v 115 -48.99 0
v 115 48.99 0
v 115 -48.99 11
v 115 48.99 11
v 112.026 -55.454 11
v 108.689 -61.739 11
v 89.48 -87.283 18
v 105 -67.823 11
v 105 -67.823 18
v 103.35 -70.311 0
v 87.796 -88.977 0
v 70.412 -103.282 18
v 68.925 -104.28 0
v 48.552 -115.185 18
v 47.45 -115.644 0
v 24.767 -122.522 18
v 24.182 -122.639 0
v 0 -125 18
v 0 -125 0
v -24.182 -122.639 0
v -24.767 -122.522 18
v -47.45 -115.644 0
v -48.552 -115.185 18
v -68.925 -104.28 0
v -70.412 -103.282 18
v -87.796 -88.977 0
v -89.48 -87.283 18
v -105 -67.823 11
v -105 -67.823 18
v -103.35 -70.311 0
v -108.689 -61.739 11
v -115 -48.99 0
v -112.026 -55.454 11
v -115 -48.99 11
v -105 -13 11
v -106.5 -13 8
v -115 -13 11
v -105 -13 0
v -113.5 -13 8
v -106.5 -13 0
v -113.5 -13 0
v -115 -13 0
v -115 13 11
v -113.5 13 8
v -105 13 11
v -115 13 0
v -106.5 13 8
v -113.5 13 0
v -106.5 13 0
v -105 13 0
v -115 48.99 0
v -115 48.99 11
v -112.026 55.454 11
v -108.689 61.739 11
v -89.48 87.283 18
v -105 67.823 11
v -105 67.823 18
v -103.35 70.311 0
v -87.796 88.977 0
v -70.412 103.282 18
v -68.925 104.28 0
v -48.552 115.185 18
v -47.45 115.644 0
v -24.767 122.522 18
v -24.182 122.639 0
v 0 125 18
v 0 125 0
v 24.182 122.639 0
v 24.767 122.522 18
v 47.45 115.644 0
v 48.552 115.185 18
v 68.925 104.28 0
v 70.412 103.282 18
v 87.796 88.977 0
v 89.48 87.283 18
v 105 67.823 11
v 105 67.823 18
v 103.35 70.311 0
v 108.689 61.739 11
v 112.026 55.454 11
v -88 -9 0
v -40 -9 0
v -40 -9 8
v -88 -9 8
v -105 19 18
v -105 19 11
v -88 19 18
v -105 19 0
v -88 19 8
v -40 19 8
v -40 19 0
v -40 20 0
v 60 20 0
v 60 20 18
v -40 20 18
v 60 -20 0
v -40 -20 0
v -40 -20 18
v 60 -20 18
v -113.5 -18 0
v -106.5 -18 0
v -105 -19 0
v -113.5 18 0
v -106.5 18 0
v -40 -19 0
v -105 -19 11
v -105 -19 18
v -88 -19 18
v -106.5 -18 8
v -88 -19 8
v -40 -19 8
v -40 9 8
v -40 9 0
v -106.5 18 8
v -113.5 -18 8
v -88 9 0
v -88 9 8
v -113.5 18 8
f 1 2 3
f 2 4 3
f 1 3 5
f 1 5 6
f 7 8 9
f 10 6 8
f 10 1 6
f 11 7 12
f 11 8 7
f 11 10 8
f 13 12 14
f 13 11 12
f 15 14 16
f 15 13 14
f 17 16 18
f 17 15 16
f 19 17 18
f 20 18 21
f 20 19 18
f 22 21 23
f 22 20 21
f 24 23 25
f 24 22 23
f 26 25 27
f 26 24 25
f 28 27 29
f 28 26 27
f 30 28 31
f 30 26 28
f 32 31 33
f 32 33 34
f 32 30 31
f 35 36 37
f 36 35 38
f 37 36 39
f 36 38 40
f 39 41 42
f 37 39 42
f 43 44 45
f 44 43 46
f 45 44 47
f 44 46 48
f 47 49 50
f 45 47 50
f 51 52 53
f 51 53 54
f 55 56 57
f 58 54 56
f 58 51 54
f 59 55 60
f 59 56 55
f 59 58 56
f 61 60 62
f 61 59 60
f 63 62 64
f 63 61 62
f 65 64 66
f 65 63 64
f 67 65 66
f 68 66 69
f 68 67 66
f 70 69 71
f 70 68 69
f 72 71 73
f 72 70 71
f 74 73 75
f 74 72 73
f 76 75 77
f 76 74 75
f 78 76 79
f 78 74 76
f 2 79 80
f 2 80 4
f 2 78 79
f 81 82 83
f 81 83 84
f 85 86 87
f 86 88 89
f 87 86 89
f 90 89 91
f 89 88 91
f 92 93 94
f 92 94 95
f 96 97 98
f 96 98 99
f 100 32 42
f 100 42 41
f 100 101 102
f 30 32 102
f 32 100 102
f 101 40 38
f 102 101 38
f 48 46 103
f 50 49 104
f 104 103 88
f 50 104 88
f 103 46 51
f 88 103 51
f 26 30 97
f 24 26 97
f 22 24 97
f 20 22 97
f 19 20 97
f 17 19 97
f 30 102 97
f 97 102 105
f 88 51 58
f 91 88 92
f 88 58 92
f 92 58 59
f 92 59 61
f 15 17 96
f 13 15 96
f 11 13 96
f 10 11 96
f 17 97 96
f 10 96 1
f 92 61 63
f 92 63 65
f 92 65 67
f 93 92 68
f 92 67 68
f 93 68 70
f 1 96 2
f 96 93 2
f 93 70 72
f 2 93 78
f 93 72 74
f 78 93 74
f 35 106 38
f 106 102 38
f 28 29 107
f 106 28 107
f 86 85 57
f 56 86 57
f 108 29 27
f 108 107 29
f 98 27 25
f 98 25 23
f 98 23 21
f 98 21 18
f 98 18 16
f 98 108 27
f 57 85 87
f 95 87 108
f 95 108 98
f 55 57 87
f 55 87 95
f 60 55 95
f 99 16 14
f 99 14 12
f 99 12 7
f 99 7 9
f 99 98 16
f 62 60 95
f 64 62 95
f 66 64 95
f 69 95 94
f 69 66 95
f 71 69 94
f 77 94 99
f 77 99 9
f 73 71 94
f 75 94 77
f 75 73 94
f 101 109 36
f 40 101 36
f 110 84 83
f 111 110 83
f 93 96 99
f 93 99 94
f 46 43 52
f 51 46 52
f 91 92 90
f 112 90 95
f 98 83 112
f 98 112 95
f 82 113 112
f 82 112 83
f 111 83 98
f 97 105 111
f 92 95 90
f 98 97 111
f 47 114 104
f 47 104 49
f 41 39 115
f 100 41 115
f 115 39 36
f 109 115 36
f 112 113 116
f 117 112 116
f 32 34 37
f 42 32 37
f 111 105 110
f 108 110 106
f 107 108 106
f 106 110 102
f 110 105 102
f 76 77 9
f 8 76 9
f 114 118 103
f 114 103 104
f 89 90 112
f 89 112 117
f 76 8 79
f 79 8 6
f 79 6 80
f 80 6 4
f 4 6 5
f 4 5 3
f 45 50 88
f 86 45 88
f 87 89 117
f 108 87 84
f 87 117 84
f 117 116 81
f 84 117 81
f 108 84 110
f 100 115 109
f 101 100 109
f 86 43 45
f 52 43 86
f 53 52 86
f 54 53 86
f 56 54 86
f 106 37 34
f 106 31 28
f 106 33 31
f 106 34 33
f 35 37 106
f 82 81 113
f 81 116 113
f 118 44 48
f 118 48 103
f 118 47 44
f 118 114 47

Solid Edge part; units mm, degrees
sketch "Sketch1" plane through (0, 0, 0) normal (0, 0, 1) x (1, 0, 0)
  circle A0 centre (0, 0) radius 125
extrude "Protrusion1" add sketch "Sketch1" along normal blind 18
sketch "Sketch2" plane through (0, 0, 18) normal (0, 0, 1) x (1, 0, 0)
  line L0 (115, 48.9898) -> (115, -48.9898)
  line L1 (149.5041, -48.9898) -> (115, -48.9898)
  line L2 (149.5041, 48.9898) -> (149.5041, -48.9898)
  line L3 (115, 48.9898) -> (149.5041, 48.9898)
extrude "ExtrudedCutout_1" cut sketch "Sketch2" against normal blind 18
sketch "Sketch3" plane through (-5, 0, 18) normal (0, 0, 1) x (0, 1, 0)
  line L0 (67.8233, -136.7696) -> (67.8233, -110)
  line L1 (67.8233, -110) -> (-67.8233, -110)
  line L2 (-67.8233, -110) -> (-67.8233, -136.7696)
  line L3 (-67.8233, -136.7696) -> (67.8233, -136.7696)
  dimension "D1" = 10
  dimension "D2" = 67.8233
  dimension "D3" = 67.8233
extrude "ExtrudedCutout_2" cut sketch "Sketch3" against normal blind 7
mirror "Mirror1" about plane through (0, 0, 0) normal (1, 0, 0) of "ExtrudedCutout_1", "ExtrudedCutout_2"
sketch "Sketch4" plane through (0, 0, 0) normal (0, 0, -1) x (-1, 0, 0)
  line L0 (115, 13) -> (105, 13)
  line L1 (105, 13) -> (105, 19)
  line L2 (105, 19) -> (88, 19)
  line L3 (88, 19) -> (88, -19)
  line L4 (88, -19) -> (105, -19)
  line L5 (105, -19) -> (105, -13)
  line L6 (105, -13) -> (115, -13)
  line L7 (115, -13) -> (115, 13)
  dimension "D1" = 38
  dimension "D2" = 88
  dimension "D3" = 17
extrude "ExtrudedCutout_6" cut sketch "Sketch4" against normal blind 18
sketch "Sketch5" plane through (0, 0, 0) normal (0, 0, -1) x (0, -1, 0)
  line L0 (-19, 88) -> (-19, -12)
  line L1 (-19, -12) -> (-9, -12)
  line L2 (-9, -12) -> (-9, 88)
  line L3 (-9, 88) -> (-19, 88)
  line L4 (19, 88) -> (19, -12)
  line L5 (19, -12) -> (9, -12)
  line L6 (9, -12) -> (9, 88)
  line L7 (9, 88) -> (19, 88)
extrude "ExtrudedCutout_7" cut sketch "Sketch5" against normal blind 8
sketch "Sketch6" plane through (0, 0, 0) normal (0, 0, -1) x (0, -1, 0)
  line L0 (-13, 113.5) -> (-18, 113.5)
  line L1 (-18, 113.5) -> (-18, 106.5)
  line L2 (-18, 106.5) -> (-13, 106.5)
  line L3 (-13, 106.5) -> (-13, 113.5)
  line L4 (13, 113.5) -> (18, 113.5)
  line L5 (18, 113.5) -> (18, 106.5)
  line L6 (18, 106.5) -> (13, 106.5)
  line L7 (13, 106.5) -> (13, 113.5)
  dimension "D1" = 5
  dimension "D2" = 5
  dimension "D3" = 1.5
  dimension "D4" = 1.5
  dimension "D5" = 1.5
  dimension "D6" = 1.5
extrude "ExtrudedCutout_8" cut sketch "Sketch6" against normal blind 8
sketch "Sketch7" plane through (0, 0, 0) normal (0, 0, -1) x (-1, 0, 0)
  line L0 (0, 20) -> (40, 20)
  line L1 (40, 20) -> (40, -20)
  line L2 (40, -20) -> (-60, -20)
  line L3 (-60, -20) -> (-60, 20)
  line L4 (-60, 20) -> (0, 20)
extrude "ExtrudedCutout_9" cut sketch "Sketch7" against normal blind 18
properties material "Wood, Ash"
